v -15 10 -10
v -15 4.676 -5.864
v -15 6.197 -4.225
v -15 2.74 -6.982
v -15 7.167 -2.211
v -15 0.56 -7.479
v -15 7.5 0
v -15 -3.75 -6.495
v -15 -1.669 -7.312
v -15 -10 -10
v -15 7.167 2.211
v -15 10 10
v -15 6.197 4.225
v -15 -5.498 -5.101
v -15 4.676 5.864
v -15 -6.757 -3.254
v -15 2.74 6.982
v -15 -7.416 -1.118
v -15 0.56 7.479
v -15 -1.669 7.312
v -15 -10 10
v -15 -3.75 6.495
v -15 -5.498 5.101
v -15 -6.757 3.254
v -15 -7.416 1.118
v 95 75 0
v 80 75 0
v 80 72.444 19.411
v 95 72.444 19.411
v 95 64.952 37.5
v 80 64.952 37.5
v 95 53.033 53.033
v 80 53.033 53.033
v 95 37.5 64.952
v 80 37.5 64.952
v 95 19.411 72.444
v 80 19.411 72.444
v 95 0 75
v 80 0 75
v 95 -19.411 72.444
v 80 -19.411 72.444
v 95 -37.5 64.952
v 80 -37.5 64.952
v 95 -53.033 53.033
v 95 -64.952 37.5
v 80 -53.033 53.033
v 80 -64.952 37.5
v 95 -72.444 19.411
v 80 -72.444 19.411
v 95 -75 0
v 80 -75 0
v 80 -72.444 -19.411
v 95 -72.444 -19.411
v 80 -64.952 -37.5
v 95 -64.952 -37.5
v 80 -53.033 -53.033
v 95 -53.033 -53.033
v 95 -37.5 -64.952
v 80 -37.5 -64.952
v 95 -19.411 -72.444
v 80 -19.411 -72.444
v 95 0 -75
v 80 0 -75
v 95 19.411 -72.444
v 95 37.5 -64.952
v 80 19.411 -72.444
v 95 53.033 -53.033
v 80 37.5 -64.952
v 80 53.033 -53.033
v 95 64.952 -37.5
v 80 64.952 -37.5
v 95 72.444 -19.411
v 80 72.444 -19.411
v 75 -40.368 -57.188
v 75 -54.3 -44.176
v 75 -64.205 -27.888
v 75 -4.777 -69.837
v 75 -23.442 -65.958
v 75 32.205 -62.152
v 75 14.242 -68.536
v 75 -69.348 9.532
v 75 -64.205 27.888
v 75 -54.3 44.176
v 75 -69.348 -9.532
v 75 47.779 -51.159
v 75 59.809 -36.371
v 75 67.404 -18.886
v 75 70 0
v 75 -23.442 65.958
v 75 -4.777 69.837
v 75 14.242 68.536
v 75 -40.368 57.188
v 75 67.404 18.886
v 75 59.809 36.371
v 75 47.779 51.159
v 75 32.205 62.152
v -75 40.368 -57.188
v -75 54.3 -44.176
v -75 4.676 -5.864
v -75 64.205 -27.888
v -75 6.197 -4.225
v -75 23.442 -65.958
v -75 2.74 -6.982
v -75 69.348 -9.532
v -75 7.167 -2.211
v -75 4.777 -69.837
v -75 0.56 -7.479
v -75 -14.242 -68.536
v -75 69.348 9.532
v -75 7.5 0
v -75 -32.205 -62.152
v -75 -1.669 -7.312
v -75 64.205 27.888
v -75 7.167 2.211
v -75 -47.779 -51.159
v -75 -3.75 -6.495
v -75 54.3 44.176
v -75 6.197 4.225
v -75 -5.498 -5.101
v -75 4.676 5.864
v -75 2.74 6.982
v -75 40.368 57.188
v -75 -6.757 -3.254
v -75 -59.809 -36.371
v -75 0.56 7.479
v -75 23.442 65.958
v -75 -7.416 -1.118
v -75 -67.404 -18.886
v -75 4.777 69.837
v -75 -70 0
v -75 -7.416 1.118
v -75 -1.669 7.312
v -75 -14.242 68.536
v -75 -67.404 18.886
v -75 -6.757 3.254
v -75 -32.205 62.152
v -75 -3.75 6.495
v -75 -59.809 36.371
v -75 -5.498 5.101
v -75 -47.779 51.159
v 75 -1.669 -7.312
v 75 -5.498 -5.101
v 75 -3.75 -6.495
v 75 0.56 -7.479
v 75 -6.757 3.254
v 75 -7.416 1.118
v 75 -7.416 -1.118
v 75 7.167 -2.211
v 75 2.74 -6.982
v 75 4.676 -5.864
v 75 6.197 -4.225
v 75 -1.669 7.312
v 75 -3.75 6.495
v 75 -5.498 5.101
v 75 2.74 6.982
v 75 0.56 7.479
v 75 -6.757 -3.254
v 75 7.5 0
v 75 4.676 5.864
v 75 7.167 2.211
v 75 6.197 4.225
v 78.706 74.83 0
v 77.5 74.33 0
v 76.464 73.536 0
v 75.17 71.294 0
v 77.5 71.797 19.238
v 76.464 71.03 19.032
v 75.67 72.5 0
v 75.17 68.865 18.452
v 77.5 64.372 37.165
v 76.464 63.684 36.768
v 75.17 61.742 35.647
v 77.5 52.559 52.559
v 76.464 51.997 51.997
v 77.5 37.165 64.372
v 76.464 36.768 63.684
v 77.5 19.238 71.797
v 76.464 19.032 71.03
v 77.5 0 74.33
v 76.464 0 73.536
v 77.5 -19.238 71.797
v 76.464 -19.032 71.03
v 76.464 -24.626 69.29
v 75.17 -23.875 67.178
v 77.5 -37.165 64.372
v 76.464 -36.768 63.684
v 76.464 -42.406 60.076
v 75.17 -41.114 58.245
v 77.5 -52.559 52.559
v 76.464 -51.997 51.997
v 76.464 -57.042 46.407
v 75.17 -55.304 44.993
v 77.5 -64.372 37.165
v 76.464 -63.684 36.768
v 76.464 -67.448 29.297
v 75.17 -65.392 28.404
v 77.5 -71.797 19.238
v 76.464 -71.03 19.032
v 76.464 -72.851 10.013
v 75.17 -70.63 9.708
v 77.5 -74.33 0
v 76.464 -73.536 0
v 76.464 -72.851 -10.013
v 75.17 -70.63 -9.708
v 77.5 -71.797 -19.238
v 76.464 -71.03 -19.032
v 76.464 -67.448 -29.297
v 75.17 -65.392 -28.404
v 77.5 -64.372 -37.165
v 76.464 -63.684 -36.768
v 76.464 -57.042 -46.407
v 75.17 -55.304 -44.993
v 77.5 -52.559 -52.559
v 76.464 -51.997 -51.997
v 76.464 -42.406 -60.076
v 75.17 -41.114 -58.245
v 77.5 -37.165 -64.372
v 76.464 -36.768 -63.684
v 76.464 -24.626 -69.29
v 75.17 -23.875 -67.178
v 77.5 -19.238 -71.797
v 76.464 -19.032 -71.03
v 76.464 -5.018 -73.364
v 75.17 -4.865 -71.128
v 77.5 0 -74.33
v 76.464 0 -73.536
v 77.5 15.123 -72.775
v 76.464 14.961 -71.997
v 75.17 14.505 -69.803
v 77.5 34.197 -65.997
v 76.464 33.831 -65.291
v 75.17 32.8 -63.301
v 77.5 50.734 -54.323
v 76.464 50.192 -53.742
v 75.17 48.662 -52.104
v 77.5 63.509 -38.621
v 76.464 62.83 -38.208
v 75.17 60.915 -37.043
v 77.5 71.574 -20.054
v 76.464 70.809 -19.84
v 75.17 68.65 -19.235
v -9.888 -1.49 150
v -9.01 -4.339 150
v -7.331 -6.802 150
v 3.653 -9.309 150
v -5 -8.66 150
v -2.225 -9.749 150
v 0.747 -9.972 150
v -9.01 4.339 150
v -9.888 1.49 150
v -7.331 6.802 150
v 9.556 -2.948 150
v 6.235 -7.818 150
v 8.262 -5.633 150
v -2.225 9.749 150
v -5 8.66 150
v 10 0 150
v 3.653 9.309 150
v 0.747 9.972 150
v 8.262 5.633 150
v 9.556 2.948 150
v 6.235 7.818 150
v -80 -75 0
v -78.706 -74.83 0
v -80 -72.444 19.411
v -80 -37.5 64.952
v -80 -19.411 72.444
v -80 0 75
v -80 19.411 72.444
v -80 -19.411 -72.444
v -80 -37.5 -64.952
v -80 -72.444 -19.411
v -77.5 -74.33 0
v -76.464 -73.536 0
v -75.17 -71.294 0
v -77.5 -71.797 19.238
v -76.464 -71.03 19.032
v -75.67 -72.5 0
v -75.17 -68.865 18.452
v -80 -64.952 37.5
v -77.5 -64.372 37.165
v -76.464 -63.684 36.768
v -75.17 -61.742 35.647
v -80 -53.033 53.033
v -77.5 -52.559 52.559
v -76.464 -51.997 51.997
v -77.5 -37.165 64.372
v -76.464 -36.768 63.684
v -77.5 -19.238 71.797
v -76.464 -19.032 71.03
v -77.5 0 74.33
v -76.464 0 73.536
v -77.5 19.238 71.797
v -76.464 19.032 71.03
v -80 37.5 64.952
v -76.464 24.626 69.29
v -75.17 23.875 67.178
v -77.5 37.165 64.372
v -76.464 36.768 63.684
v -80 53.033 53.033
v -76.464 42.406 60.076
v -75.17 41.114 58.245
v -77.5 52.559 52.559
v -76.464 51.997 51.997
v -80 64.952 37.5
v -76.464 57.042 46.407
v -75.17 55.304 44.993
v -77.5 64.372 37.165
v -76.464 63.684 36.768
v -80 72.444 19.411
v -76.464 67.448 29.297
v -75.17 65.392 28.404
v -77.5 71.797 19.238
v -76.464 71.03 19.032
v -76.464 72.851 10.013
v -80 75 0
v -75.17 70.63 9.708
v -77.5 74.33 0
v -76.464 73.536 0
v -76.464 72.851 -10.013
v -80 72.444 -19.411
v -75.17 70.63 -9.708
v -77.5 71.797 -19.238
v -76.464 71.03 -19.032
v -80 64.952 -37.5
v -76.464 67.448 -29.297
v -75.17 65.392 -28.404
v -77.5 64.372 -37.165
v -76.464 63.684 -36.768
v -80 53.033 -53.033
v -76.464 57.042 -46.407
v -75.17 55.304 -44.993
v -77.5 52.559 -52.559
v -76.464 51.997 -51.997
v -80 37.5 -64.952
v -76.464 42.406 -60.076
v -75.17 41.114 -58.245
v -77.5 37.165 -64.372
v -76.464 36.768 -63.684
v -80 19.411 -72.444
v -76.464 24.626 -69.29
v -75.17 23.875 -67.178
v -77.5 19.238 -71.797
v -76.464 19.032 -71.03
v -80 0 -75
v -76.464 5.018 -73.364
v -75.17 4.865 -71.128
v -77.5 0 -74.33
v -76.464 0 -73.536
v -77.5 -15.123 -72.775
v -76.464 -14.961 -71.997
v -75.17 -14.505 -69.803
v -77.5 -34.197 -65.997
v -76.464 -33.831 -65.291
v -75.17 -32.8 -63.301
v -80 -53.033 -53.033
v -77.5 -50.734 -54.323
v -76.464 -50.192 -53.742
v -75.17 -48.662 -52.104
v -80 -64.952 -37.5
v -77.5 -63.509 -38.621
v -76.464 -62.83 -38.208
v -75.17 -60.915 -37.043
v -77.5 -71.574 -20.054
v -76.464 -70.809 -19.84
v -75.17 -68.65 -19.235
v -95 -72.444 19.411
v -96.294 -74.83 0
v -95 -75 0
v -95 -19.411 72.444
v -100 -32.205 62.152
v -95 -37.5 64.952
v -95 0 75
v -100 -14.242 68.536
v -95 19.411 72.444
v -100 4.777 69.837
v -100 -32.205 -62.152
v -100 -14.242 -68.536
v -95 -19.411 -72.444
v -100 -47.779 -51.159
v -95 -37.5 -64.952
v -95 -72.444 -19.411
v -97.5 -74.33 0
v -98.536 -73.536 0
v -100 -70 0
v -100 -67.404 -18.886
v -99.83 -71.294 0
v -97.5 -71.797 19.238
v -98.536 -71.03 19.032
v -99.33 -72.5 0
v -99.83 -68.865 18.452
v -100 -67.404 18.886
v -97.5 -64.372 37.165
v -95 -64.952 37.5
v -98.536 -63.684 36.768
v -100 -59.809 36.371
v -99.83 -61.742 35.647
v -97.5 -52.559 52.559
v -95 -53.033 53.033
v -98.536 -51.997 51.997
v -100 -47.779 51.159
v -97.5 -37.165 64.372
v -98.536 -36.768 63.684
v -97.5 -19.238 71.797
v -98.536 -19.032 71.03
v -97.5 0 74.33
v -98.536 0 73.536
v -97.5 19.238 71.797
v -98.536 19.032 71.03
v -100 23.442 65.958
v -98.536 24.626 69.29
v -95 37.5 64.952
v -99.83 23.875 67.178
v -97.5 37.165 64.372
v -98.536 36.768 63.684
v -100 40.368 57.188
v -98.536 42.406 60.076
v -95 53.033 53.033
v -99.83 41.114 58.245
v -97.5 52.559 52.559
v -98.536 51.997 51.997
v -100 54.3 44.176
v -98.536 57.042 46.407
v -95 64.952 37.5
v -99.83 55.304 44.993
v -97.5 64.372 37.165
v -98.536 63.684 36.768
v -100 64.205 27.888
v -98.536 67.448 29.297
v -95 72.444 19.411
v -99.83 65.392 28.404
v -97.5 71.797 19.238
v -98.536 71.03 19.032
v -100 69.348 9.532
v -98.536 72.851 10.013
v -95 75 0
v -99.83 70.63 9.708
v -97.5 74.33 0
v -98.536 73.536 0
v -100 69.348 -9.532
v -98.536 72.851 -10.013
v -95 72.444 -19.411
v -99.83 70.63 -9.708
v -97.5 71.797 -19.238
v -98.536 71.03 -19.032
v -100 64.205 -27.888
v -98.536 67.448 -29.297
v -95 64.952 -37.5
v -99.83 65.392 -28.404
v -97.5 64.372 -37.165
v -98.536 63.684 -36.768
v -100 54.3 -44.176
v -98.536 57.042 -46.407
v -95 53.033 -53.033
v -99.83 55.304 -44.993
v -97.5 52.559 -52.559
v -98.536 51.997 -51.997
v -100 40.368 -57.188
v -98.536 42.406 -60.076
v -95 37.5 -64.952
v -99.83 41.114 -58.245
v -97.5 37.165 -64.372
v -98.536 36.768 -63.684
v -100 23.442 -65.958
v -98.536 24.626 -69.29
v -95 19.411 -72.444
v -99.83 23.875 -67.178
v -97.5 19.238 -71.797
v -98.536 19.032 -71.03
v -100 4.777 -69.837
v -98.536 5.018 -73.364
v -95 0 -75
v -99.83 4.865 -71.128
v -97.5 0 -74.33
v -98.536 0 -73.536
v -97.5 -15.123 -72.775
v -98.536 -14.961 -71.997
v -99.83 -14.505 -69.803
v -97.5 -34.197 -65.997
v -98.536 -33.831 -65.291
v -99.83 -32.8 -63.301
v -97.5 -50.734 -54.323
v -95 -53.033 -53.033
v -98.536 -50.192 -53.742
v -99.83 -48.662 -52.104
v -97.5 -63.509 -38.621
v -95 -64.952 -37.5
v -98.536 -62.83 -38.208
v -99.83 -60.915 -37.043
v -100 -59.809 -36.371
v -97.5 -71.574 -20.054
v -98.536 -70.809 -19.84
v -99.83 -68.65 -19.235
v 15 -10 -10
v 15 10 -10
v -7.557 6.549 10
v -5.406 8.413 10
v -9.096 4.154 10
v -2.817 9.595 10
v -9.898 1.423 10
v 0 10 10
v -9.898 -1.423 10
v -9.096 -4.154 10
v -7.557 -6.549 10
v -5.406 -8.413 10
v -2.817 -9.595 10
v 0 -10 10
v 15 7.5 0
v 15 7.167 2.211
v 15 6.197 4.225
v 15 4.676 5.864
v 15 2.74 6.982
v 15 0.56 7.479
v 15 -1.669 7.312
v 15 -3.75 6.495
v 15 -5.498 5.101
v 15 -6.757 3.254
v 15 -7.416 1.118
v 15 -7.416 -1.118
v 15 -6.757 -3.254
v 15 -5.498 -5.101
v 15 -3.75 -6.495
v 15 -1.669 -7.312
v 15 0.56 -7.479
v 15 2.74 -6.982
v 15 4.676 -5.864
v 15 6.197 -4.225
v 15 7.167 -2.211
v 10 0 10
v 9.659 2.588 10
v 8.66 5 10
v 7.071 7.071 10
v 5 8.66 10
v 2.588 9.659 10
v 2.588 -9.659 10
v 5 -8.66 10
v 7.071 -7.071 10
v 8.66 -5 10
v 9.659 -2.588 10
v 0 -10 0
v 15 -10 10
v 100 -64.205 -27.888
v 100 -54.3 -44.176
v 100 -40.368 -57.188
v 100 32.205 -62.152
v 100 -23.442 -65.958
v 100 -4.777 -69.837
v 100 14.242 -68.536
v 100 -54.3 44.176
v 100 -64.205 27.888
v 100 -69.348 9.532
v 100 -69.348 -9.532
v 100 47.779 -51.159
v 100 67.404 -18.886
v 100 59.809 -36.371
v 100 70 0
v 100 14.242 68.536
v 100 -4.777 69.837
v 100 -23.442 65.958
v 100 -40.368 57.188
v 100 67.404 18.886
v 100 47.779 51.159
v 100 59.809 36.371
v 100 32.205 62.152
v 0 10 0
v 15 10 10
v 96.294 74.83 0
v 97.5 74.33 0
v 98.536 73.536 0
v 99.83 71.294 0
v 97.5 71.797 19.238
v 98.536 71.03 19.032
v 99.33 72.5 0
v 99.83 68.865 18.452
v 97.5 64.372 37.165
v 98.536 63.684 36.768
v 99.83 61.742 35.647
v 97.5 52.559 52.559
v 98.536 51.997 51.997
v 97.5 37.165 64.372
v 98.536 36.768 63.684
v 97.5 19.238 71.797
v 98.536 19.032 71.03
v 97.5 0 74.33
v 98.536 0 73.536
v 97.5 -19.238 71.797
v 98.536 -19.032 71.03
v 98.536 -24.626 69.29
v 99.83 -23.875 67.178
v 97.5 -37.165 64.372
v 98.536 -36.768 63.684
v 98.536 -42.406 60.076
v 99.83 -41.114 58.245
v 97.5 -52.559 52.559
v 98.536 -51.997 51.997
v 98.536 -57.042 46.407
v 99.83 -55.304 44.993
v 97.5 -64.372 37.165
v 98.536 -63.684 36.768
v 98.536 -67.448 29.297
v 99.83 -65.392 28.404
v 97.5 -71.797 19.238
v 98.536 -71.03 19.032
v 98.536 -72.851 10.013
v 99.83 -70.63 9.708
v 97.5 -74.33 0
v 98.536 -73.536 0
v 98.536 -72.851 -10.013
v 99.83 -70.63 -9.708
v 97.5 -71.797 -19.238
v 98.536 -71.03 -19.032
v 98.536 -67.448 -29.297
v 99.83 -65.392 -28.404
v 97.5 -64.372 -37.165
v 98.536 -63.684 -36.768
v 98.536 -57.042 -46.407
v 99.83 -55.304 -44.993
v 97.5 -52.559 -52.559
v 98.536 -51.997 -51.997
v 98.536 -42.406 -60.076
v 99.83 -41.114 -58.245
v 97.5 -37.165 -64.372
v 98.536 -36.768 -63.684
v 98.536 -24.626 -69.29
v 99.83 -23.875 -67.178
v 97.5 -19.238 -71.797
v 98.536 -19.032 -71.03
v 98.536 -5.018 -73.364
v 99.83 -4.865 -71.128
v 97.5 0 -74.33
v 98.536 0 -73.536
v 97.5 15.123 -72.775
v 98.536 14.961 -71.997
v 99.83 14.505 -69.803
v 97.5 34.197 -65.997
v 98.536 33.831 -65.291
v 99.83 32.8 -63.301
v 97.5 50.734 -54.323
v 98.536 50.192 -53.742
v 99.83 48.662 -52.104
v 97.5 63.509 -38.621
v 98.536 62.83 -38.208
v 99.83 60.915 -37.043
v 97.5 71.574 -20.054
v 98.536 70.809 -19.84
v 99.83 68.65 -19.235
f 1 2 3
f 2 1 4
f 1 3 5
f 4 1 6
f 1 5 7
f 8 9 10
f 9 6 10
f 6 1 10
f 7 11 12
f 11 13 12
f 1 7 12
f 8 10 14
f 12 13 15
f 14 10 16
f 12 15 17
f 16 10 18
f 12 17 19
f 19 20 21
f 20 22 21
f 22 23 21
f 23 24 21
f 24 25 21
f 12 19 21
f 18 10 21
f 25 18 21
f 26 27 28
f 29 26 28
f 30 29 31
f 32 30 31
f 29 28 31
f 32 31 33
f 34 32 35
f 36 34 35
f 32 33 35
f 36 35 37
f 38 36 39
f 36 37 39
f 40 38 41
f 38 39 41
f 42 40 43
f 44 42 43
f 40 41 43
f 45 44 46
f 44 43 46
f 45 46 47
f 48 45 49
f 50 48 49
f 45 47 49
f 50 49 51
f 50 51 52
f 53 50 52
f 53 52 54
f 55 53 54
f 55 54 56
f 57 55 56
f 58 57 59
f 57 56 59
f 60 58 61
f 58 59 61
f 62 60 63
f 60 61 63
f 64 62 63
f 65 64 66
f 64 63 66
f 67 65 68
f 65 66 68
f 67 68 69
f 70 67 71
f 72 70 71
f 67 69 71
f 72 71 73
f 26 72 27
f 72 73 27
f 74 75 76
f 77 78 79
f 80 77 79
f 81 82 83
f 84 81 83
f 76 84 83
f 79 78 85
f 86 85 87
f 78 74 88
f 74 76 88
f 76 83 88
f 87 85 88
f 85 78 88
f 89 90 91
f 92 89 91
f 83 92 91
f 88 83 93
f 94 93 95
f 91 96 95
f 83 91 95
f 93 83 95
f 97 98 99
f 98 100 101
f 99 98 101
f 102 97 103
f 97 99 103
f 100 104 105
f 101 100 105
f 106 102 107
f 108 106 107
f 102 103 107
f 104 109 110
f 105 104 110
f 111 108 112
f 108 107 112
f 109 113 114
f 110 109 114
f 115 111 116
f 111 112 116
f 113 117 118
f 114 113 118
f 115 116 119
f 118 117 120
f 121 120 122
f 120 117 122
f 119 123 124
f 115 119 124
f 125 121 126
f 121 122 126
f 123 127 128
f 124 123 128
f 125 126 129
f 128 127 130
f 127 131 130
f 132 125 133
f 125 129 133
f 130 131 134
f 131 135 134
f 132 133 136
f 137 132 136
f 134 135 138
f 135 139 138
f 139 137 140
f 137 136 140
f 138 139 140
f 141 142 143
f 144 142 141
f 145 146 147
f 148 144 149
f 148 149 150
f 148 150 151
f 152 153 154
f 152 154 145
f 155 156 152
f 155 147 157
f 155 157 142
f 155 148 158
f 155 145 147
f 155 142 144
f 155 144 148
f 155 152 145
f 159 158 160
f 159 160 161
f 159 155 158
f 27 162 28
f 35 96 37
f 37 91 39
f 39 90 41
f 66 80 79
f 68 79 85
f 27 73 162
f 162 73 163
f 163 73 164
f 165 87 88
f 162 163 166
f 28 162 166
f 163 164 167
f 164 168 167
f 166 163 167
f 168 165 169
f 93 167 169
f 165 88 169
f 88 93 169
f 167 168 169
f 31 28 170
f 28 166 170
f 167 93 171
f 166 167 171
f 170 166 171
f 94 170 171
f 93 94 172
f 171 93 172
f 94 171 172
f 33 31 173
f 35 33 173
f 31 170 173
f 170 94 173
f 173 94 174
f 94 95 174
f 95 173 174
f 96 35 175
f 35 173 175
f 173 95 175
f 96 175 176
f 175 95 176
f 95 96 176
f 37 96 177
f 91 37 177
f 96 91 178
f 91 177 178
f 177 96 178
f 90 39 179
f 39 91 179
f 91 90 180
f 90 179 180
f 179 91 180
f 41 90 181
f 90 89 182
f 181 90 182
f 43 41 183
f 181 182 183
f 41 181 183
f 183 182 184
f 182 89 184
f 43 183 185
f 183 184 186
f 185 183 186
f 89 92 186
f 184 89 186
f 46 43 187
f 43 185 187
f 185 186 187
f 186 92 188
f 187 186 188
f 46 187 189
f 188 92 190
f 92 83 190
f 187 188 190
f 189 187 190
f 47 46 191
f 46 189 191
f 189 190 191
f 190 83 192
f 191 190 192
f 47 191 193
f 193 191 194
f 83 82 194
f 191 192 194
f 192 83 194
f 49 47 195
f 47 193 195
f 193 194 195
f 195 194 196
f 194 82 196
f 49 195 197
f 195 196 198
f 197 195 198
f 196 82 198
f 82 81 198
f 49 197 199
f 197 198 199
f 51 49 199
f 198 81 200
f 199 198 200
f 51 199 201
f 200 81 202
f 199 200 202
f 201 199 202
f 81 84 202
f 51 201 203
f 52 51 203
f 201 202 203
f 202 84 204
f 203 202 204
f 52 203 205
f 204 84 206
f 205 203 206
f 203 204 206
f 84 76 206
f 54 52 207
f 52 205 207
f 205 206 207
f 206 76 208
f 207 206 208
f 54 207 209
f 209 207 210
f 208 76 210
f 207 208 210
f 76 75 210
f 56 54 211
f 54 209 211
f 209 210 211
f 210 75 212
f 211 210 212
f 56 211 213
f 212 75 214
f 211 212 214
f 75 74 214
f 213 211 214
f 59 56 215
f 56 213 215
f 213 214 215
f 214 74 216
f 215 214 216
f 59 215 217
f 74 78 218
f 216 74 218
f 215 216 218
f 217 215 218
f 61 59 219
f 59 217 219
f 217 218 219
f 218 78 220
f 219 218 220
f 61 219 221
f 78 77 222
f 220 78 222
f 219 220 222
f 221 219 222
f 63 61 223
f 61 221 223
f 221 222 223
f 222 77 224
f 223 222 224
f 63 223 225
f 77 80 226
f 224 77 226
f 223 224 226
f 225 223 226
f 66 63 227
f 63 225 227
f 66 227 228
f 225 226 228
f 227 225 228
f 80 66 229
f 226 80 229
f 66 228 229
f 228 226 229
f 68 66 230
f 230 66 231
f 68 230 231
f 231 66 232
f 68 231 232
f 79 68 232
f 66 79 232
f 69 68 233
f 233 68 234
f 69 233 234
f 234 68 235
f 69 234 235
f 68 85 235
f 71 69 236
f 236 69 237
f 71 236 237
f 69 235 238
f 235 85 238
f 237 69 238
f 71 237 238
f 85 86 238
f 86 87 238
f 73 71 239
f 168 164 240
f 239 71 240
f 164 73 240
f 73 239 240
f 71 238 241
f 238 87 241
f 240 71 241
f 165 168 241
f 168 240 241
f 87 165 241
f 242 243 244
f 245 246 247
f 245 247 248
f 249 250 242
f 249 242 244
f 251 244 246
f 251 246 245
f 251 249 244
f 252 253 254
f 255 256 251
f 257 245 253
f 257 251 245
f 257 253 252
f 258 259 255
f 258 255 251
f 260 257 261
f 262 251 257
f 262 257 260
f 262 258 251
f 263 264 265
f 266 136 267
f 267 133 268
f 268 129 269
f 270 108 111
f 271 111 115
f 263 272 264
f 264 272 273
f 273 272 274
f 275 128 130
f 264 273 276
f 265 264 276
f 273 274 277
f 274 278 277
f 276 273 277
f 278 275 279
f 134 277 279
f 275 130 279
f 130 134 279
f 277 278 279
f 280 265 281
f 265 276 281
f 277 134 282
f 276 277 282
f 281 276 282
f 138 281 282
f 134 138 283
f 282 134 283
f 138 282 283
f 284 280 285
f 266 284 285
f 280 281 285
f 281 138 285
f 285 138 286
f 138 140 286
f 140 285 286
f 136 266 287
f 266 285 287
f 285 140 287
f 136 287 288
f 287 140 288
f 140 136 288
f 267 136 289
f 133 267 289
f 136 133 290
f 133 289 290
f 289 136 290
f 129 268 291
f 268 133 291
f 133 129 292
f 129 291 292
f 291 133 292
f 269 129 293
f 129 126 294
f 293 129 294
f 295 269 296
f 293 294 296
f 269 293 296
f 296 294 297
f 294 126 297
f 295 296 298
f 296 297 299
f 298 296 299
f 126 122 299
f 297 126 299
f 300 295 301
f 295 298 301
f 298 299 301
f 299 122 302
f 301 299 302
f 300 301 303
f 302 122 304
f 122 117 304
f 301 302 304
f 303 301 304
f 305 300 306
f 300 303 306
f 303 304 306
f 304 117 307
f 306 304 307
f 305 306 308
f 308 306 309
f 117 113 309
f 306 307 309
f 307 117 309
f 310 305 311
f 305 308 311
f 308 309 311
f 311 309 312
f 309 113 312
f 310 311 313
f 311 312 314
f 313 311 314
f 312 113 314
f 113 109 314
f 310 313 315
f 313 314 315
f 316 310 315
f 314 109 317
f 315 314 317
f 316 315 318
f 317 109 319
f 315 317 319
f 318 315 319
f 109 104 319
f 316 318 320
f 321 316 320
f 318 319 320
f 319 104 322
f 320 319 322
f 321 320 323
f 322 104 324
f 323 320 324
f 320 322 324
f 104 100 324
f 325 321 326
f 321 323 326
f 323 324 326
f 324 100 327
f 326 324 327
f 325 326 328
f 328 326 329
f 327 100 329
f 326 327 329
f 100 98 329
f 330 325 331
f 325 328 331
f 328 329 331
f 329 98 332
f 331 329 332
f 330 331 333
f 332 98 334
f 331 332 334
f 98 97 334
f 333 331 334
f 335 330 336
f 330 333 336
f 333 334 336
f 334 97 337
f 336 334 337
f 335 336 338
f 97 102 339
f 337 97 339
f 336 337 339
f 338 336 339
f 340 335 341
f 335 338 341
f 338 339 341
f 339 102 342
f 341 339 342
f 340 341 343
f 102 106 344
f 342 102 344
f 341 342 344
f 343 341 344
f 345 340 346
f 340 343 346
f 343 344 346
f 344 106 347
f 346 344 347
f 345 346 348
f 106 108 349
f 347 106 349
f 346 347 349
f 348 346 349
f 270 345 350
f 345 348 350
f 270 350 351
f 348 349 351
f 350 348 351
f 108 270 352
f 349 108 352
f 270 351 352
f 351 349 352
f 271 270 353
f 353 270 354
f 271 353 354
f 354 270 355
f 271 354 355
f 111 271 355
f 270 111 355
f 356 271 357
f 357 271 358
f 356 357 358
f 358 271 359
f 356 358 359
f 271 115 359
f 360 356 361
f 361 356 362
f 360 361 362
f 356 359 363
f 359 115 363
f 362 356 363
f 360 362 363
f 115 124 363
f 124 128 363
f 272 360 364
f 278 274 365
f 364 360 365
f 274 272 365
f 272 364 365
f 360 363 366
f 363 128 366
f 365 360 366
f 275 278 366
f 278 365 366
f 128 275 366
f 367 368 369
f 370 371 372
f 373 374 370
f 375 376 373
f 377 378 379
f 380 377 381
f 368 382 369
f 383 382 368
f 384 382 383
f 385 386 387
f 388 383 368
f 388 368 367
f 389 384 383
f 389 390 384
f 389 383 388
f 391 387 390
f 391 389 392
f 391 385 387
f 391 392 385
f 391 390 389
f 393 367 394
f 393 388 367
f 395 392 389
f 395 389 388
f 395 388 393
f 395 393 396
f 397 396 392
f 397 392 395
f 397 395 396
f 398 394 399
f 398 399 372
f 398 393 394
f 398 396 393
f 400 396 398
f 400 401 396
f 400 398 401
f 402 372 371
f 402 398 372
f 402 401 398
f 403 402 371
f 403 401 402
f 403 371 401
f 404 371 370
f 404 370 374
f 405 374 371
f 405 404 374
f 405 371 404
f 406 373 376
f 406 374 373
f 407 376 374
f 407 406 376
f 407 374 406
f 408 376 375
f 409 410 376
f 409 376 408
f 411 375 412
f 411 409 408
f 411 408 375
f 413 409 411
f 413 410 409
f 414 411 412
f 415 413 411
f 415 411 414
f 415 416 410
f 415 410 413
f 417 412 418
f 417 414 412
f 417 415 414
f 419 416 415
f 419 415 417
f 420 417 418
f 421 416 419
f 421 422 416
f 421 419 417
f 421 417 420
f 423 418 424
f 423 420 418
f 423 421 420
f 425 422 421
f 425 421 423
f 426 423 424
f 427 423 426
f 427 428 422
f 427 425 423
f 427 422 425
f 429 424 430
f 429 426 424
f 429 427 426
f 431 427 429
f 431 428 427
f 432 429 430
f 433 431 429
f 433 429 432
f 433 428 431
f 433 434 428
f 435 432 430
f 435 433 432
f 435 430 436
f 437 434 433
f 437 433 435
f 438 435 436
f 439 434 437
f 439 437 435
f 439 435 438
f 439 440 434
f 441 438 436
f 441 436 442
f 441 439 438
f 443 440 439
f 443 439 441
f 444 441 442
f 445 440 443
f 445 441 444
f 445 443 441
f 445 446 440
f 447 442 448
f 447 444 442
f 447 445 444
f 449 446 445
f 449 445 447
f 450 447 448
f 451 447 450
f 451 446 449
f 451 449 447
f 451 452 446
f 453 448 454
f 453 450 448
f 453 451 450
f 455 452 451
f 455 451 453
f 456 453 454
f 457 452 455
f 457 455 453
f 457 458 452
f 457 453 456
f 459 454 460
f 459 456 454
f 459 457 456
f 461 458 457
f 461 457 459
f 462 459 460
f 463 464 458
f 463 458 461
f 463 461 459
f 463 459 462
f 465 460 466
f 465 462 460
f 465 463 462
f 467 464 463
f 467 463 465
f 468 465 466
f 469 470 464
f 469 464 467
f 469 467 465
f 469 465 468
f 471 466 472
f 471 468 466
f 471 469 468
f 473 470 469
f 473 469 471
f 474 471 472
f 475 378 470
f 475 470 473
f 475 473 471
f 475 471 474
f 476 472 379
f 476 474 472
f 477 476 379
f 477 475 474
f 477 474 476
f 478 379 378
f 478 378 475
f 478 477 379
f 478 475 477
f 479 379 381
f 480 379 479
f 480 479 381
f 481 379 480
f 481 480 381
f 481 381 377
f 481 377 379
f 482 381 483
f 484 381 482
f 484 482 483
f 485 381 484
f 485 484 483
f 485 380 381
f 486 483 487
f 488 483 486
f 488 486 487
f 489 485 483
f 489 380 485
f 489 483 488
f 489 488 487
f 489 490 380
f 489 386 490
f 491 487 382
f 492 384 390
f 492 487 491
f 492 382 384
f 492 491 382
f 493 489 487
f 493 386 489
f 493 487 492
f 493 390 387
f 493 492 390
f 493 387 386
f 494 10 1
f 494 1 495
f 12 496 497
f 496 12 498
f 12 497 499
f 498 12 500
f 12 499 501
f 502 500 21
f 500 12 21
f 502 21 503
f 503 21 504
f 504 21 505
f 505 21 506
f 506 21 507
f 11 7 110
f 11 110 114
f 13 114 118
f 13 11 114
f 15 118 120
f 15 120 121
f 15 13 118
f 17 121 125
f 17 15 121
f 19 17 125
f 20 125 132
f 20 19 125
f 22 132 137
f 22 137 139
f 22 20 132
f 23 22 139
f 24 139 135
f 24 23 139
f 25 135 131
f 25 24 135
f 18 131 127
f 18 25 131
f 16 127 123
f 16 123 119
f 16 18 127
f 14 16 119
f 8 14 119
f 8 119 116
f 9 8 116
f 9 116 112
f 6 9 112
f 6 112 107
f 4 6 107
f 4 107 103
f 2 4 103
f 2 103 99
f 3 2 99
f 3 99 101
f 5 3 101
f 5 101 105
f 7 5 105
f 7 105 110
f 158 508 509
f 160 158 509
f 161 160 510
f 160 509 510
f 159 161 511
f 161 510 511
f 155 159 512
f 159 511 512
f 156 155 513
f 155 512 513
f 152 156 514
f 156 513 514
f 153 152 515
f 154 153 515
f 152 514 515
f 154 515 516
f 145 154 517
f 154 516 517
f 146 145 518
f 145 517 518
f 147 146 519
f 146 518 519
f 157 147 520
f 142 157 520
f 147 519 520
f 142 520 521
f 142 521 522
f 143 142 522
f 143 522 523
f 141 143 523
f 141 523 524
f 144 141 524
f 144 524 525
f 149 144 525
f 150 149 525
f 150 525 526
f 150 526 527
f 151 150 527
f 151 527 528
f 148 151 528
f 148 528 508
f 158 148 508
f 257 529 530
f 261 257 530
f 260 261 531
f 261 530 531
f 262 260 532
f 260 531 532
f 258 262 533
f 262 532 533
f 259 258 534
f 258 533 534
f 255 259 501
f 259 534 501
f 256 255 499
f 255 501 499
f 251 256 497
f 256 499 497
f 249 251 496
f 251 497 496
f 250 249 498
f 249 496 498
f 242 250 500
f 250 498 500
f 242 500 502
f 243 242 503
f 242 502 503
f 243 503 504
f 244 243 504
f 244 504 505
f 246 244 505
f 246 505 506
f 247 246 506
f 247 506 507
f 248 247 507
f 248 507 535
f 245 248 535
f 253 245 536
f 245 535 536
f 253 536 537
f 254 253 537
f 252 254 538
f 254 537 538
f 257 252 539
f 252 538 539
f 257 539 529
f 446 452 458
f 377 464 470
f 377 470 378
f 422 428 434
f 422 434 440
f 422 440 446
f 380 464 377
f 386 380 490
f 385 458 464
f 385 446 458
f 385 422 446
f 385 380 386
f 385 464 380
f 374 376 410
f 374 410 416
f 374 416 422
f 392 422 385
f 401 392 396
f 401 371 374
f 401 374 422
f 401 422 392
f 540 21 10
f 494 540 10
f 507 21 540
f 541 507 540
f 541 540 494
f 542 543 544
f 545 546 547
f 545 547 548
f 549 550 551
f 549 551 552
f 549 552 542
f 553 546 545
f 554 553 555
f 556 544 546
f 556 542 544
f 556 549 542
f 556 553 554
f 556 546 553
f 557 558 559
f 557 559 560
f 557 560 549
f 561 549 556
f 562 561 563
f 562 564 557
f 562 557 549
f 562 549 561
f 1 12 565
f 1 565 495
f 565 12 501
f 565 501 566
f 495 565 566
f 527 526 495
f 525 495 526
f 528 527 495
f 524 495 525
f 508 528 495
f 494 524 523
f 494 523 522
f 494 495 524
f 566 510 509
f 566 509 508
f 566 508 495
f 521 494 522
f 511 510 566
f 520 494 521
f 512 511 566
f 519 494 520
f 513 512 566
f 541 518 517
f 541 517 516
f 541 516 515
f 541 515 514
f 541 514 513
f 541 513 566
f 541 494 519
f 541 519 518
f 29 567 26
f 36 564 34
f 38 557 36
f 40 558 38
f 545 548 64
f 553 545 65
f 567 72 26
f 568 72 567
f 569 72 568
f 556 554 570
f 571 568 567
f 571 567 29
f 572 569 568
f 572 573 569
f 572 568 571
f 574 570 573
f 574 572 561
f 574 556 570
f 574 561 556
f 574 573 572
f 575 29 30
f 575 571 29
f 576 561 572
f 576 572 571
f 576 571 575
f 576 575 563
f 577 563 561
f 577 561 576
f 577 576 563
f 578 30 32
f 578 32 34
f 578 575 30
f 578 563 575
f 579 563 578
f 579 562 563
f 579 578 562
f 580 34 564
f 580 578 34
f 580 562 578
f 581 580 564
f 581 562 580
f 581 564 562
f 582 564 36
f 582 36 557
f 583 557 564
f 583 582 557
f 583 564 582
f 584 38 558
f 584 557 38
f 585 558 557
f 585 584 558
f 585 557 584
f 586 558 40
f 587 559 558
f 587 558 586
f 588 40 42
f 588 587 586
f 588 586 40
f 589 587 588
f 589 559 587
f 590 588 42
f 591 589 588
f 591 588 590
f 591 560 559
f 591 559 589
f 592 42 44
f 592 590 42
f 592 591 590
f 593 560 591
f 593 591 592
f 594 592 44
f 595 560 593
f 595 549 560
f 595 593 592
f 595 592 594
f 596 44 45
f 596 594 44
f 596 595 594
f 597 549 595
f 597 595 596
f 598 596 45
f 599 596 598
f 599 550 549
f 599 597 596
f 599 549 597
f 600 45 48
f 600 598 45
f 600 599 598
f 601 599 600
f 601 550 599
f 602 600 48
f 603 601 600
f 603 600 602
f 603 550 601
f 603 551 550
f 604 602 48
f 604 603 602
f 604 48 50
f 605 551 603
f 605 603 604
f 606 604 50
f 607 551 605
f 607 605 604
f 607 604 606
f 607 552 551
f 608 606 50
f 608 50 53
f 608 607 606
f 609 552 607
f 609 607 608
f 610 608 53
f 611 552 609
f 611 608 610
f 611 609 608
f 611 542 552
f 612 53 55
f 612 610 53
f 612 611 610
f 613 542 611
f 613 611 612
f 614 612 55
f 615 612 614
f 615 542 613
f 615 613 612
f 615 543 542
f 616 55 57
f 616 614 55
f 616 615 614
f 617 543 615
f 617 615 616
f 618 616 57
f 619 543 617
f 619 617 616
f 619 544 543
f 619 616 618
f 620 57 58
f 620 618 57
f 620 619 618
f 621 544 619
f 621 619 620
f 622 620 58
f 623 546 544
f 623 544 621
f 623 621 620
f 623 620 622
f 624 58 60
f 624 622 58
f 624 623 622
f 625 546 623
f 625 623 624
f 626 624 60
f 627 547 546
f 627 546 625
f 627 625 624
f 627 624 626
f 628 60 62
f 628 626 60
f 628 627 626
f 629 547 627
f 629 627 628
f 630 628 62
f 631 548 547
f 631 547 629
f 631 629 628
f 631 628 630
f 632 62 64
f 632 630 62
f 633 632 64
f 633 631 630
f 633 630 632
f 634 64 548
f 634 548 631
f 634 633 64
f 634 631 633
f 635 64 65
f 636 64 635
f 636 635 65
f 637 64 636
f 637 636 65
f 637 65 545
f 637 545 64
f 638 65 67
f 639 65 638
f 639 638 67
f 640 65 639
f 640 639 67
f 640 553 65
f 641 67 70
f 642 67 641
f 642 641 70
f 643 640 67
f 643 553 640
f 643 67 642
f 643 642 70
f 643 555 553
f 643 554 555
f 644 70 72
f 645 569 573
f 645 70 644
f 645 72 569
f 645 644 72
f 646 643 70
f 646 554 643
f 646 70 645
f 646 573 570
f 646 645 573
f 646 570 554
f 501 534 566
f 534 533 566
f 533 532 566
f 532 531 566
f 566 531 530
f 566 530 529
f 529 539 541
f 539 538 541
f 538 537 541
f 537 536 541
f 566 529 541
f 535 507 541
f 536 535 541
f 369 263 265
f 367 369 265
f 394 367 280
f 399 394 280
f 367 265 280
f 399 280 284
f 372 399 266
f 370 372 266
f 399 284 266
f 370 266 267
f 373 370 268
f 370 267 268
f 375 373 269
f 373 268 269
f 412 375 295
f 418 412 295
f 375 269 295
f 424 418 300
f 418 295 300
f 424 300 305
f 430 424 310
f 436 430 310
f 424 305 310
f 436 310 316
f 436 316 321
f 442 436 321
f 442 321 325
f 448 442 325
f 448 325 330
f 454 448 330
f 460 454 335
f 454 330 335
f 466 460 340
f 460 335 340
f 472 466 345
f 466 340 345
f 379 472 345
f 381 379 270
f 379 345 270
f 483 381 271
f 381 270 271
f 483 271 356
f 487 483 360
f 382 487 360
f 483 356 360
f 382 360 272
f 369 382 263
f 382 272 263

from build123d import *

# Parameters (mm, degrees)
F0_W          = 30
F0_H          = 20
F1_DEPTH      = 10
F1_DEPTH_BACK = 10
F2_R          = 7.5
F3_DEPTH      = 75
F3_DEPTH_BACK = 75
F4_R          = 75
F5_DEPTH      = 25
F6_R          = 5
F7_R          = 75
F8_DEPTH      = 25
F9_R          = 5
F10_R         = 10
F11_DEPTH     = 150


with BuildPart() as f1:
    # F0 (on Front) → F1 (new body, two sides)
    with BuildSketch(Plane.XZ) as f1_sk:
        Rectangle(F0_W, F0_H)
    extrude(amount=F1_DEPTH)
    extrude(f1_sk.sketch, amount=-F1_DEPTH_BACK)

    # F2 (on Right) → F3 (join, two sides)
    with BuildSketch(Plane.YZ) as f3_sk:
        Circle(F2_R)
    extrude(amount=F3_DEPTH)
    extrude(f3_sk.sketch, amount=-F3_DEPTH_BACK)

    # F7 (on face) → F8 (join)
    with BuildSketch(Plane(origin=(-75, 0, 0), x_dir=(0, -1, 0), z_dir=(-1, 0, 0))):
        Circle(F7_R)
    extrude(amount=F8_DEPTH)

    # F9
    f9_edges = [f1.edges().sort_by_distance(p)[0] for p in [
        (-100, 75, 0),
        (-75, 75, 0),
    ]]
    fillet(f9_edges, radius=F9_R)

    # F10 (on Top) → F11 (join)
    with BuildSketch(Plane.XY):
        Circle(F10_R)
    extrude(amount=F11_DEPTH)


with BuildPart() as f5:
    # F4 (on face) → F5 (new body)
    with BuildSketch(Plane.YZ.offset(75)):
        Circle(F4_R)
    extrude(amount=F5_DEPTH)

    # F6
    f6_edges = [f5.edges().sort_by_distance(p)[0] for p in [
        (75, -75, 0),
        (100, -75, 0),
    ]]
    fillet(f6_edges, radius=F6_R)


solid = Compound([f1.part, f5.part])
